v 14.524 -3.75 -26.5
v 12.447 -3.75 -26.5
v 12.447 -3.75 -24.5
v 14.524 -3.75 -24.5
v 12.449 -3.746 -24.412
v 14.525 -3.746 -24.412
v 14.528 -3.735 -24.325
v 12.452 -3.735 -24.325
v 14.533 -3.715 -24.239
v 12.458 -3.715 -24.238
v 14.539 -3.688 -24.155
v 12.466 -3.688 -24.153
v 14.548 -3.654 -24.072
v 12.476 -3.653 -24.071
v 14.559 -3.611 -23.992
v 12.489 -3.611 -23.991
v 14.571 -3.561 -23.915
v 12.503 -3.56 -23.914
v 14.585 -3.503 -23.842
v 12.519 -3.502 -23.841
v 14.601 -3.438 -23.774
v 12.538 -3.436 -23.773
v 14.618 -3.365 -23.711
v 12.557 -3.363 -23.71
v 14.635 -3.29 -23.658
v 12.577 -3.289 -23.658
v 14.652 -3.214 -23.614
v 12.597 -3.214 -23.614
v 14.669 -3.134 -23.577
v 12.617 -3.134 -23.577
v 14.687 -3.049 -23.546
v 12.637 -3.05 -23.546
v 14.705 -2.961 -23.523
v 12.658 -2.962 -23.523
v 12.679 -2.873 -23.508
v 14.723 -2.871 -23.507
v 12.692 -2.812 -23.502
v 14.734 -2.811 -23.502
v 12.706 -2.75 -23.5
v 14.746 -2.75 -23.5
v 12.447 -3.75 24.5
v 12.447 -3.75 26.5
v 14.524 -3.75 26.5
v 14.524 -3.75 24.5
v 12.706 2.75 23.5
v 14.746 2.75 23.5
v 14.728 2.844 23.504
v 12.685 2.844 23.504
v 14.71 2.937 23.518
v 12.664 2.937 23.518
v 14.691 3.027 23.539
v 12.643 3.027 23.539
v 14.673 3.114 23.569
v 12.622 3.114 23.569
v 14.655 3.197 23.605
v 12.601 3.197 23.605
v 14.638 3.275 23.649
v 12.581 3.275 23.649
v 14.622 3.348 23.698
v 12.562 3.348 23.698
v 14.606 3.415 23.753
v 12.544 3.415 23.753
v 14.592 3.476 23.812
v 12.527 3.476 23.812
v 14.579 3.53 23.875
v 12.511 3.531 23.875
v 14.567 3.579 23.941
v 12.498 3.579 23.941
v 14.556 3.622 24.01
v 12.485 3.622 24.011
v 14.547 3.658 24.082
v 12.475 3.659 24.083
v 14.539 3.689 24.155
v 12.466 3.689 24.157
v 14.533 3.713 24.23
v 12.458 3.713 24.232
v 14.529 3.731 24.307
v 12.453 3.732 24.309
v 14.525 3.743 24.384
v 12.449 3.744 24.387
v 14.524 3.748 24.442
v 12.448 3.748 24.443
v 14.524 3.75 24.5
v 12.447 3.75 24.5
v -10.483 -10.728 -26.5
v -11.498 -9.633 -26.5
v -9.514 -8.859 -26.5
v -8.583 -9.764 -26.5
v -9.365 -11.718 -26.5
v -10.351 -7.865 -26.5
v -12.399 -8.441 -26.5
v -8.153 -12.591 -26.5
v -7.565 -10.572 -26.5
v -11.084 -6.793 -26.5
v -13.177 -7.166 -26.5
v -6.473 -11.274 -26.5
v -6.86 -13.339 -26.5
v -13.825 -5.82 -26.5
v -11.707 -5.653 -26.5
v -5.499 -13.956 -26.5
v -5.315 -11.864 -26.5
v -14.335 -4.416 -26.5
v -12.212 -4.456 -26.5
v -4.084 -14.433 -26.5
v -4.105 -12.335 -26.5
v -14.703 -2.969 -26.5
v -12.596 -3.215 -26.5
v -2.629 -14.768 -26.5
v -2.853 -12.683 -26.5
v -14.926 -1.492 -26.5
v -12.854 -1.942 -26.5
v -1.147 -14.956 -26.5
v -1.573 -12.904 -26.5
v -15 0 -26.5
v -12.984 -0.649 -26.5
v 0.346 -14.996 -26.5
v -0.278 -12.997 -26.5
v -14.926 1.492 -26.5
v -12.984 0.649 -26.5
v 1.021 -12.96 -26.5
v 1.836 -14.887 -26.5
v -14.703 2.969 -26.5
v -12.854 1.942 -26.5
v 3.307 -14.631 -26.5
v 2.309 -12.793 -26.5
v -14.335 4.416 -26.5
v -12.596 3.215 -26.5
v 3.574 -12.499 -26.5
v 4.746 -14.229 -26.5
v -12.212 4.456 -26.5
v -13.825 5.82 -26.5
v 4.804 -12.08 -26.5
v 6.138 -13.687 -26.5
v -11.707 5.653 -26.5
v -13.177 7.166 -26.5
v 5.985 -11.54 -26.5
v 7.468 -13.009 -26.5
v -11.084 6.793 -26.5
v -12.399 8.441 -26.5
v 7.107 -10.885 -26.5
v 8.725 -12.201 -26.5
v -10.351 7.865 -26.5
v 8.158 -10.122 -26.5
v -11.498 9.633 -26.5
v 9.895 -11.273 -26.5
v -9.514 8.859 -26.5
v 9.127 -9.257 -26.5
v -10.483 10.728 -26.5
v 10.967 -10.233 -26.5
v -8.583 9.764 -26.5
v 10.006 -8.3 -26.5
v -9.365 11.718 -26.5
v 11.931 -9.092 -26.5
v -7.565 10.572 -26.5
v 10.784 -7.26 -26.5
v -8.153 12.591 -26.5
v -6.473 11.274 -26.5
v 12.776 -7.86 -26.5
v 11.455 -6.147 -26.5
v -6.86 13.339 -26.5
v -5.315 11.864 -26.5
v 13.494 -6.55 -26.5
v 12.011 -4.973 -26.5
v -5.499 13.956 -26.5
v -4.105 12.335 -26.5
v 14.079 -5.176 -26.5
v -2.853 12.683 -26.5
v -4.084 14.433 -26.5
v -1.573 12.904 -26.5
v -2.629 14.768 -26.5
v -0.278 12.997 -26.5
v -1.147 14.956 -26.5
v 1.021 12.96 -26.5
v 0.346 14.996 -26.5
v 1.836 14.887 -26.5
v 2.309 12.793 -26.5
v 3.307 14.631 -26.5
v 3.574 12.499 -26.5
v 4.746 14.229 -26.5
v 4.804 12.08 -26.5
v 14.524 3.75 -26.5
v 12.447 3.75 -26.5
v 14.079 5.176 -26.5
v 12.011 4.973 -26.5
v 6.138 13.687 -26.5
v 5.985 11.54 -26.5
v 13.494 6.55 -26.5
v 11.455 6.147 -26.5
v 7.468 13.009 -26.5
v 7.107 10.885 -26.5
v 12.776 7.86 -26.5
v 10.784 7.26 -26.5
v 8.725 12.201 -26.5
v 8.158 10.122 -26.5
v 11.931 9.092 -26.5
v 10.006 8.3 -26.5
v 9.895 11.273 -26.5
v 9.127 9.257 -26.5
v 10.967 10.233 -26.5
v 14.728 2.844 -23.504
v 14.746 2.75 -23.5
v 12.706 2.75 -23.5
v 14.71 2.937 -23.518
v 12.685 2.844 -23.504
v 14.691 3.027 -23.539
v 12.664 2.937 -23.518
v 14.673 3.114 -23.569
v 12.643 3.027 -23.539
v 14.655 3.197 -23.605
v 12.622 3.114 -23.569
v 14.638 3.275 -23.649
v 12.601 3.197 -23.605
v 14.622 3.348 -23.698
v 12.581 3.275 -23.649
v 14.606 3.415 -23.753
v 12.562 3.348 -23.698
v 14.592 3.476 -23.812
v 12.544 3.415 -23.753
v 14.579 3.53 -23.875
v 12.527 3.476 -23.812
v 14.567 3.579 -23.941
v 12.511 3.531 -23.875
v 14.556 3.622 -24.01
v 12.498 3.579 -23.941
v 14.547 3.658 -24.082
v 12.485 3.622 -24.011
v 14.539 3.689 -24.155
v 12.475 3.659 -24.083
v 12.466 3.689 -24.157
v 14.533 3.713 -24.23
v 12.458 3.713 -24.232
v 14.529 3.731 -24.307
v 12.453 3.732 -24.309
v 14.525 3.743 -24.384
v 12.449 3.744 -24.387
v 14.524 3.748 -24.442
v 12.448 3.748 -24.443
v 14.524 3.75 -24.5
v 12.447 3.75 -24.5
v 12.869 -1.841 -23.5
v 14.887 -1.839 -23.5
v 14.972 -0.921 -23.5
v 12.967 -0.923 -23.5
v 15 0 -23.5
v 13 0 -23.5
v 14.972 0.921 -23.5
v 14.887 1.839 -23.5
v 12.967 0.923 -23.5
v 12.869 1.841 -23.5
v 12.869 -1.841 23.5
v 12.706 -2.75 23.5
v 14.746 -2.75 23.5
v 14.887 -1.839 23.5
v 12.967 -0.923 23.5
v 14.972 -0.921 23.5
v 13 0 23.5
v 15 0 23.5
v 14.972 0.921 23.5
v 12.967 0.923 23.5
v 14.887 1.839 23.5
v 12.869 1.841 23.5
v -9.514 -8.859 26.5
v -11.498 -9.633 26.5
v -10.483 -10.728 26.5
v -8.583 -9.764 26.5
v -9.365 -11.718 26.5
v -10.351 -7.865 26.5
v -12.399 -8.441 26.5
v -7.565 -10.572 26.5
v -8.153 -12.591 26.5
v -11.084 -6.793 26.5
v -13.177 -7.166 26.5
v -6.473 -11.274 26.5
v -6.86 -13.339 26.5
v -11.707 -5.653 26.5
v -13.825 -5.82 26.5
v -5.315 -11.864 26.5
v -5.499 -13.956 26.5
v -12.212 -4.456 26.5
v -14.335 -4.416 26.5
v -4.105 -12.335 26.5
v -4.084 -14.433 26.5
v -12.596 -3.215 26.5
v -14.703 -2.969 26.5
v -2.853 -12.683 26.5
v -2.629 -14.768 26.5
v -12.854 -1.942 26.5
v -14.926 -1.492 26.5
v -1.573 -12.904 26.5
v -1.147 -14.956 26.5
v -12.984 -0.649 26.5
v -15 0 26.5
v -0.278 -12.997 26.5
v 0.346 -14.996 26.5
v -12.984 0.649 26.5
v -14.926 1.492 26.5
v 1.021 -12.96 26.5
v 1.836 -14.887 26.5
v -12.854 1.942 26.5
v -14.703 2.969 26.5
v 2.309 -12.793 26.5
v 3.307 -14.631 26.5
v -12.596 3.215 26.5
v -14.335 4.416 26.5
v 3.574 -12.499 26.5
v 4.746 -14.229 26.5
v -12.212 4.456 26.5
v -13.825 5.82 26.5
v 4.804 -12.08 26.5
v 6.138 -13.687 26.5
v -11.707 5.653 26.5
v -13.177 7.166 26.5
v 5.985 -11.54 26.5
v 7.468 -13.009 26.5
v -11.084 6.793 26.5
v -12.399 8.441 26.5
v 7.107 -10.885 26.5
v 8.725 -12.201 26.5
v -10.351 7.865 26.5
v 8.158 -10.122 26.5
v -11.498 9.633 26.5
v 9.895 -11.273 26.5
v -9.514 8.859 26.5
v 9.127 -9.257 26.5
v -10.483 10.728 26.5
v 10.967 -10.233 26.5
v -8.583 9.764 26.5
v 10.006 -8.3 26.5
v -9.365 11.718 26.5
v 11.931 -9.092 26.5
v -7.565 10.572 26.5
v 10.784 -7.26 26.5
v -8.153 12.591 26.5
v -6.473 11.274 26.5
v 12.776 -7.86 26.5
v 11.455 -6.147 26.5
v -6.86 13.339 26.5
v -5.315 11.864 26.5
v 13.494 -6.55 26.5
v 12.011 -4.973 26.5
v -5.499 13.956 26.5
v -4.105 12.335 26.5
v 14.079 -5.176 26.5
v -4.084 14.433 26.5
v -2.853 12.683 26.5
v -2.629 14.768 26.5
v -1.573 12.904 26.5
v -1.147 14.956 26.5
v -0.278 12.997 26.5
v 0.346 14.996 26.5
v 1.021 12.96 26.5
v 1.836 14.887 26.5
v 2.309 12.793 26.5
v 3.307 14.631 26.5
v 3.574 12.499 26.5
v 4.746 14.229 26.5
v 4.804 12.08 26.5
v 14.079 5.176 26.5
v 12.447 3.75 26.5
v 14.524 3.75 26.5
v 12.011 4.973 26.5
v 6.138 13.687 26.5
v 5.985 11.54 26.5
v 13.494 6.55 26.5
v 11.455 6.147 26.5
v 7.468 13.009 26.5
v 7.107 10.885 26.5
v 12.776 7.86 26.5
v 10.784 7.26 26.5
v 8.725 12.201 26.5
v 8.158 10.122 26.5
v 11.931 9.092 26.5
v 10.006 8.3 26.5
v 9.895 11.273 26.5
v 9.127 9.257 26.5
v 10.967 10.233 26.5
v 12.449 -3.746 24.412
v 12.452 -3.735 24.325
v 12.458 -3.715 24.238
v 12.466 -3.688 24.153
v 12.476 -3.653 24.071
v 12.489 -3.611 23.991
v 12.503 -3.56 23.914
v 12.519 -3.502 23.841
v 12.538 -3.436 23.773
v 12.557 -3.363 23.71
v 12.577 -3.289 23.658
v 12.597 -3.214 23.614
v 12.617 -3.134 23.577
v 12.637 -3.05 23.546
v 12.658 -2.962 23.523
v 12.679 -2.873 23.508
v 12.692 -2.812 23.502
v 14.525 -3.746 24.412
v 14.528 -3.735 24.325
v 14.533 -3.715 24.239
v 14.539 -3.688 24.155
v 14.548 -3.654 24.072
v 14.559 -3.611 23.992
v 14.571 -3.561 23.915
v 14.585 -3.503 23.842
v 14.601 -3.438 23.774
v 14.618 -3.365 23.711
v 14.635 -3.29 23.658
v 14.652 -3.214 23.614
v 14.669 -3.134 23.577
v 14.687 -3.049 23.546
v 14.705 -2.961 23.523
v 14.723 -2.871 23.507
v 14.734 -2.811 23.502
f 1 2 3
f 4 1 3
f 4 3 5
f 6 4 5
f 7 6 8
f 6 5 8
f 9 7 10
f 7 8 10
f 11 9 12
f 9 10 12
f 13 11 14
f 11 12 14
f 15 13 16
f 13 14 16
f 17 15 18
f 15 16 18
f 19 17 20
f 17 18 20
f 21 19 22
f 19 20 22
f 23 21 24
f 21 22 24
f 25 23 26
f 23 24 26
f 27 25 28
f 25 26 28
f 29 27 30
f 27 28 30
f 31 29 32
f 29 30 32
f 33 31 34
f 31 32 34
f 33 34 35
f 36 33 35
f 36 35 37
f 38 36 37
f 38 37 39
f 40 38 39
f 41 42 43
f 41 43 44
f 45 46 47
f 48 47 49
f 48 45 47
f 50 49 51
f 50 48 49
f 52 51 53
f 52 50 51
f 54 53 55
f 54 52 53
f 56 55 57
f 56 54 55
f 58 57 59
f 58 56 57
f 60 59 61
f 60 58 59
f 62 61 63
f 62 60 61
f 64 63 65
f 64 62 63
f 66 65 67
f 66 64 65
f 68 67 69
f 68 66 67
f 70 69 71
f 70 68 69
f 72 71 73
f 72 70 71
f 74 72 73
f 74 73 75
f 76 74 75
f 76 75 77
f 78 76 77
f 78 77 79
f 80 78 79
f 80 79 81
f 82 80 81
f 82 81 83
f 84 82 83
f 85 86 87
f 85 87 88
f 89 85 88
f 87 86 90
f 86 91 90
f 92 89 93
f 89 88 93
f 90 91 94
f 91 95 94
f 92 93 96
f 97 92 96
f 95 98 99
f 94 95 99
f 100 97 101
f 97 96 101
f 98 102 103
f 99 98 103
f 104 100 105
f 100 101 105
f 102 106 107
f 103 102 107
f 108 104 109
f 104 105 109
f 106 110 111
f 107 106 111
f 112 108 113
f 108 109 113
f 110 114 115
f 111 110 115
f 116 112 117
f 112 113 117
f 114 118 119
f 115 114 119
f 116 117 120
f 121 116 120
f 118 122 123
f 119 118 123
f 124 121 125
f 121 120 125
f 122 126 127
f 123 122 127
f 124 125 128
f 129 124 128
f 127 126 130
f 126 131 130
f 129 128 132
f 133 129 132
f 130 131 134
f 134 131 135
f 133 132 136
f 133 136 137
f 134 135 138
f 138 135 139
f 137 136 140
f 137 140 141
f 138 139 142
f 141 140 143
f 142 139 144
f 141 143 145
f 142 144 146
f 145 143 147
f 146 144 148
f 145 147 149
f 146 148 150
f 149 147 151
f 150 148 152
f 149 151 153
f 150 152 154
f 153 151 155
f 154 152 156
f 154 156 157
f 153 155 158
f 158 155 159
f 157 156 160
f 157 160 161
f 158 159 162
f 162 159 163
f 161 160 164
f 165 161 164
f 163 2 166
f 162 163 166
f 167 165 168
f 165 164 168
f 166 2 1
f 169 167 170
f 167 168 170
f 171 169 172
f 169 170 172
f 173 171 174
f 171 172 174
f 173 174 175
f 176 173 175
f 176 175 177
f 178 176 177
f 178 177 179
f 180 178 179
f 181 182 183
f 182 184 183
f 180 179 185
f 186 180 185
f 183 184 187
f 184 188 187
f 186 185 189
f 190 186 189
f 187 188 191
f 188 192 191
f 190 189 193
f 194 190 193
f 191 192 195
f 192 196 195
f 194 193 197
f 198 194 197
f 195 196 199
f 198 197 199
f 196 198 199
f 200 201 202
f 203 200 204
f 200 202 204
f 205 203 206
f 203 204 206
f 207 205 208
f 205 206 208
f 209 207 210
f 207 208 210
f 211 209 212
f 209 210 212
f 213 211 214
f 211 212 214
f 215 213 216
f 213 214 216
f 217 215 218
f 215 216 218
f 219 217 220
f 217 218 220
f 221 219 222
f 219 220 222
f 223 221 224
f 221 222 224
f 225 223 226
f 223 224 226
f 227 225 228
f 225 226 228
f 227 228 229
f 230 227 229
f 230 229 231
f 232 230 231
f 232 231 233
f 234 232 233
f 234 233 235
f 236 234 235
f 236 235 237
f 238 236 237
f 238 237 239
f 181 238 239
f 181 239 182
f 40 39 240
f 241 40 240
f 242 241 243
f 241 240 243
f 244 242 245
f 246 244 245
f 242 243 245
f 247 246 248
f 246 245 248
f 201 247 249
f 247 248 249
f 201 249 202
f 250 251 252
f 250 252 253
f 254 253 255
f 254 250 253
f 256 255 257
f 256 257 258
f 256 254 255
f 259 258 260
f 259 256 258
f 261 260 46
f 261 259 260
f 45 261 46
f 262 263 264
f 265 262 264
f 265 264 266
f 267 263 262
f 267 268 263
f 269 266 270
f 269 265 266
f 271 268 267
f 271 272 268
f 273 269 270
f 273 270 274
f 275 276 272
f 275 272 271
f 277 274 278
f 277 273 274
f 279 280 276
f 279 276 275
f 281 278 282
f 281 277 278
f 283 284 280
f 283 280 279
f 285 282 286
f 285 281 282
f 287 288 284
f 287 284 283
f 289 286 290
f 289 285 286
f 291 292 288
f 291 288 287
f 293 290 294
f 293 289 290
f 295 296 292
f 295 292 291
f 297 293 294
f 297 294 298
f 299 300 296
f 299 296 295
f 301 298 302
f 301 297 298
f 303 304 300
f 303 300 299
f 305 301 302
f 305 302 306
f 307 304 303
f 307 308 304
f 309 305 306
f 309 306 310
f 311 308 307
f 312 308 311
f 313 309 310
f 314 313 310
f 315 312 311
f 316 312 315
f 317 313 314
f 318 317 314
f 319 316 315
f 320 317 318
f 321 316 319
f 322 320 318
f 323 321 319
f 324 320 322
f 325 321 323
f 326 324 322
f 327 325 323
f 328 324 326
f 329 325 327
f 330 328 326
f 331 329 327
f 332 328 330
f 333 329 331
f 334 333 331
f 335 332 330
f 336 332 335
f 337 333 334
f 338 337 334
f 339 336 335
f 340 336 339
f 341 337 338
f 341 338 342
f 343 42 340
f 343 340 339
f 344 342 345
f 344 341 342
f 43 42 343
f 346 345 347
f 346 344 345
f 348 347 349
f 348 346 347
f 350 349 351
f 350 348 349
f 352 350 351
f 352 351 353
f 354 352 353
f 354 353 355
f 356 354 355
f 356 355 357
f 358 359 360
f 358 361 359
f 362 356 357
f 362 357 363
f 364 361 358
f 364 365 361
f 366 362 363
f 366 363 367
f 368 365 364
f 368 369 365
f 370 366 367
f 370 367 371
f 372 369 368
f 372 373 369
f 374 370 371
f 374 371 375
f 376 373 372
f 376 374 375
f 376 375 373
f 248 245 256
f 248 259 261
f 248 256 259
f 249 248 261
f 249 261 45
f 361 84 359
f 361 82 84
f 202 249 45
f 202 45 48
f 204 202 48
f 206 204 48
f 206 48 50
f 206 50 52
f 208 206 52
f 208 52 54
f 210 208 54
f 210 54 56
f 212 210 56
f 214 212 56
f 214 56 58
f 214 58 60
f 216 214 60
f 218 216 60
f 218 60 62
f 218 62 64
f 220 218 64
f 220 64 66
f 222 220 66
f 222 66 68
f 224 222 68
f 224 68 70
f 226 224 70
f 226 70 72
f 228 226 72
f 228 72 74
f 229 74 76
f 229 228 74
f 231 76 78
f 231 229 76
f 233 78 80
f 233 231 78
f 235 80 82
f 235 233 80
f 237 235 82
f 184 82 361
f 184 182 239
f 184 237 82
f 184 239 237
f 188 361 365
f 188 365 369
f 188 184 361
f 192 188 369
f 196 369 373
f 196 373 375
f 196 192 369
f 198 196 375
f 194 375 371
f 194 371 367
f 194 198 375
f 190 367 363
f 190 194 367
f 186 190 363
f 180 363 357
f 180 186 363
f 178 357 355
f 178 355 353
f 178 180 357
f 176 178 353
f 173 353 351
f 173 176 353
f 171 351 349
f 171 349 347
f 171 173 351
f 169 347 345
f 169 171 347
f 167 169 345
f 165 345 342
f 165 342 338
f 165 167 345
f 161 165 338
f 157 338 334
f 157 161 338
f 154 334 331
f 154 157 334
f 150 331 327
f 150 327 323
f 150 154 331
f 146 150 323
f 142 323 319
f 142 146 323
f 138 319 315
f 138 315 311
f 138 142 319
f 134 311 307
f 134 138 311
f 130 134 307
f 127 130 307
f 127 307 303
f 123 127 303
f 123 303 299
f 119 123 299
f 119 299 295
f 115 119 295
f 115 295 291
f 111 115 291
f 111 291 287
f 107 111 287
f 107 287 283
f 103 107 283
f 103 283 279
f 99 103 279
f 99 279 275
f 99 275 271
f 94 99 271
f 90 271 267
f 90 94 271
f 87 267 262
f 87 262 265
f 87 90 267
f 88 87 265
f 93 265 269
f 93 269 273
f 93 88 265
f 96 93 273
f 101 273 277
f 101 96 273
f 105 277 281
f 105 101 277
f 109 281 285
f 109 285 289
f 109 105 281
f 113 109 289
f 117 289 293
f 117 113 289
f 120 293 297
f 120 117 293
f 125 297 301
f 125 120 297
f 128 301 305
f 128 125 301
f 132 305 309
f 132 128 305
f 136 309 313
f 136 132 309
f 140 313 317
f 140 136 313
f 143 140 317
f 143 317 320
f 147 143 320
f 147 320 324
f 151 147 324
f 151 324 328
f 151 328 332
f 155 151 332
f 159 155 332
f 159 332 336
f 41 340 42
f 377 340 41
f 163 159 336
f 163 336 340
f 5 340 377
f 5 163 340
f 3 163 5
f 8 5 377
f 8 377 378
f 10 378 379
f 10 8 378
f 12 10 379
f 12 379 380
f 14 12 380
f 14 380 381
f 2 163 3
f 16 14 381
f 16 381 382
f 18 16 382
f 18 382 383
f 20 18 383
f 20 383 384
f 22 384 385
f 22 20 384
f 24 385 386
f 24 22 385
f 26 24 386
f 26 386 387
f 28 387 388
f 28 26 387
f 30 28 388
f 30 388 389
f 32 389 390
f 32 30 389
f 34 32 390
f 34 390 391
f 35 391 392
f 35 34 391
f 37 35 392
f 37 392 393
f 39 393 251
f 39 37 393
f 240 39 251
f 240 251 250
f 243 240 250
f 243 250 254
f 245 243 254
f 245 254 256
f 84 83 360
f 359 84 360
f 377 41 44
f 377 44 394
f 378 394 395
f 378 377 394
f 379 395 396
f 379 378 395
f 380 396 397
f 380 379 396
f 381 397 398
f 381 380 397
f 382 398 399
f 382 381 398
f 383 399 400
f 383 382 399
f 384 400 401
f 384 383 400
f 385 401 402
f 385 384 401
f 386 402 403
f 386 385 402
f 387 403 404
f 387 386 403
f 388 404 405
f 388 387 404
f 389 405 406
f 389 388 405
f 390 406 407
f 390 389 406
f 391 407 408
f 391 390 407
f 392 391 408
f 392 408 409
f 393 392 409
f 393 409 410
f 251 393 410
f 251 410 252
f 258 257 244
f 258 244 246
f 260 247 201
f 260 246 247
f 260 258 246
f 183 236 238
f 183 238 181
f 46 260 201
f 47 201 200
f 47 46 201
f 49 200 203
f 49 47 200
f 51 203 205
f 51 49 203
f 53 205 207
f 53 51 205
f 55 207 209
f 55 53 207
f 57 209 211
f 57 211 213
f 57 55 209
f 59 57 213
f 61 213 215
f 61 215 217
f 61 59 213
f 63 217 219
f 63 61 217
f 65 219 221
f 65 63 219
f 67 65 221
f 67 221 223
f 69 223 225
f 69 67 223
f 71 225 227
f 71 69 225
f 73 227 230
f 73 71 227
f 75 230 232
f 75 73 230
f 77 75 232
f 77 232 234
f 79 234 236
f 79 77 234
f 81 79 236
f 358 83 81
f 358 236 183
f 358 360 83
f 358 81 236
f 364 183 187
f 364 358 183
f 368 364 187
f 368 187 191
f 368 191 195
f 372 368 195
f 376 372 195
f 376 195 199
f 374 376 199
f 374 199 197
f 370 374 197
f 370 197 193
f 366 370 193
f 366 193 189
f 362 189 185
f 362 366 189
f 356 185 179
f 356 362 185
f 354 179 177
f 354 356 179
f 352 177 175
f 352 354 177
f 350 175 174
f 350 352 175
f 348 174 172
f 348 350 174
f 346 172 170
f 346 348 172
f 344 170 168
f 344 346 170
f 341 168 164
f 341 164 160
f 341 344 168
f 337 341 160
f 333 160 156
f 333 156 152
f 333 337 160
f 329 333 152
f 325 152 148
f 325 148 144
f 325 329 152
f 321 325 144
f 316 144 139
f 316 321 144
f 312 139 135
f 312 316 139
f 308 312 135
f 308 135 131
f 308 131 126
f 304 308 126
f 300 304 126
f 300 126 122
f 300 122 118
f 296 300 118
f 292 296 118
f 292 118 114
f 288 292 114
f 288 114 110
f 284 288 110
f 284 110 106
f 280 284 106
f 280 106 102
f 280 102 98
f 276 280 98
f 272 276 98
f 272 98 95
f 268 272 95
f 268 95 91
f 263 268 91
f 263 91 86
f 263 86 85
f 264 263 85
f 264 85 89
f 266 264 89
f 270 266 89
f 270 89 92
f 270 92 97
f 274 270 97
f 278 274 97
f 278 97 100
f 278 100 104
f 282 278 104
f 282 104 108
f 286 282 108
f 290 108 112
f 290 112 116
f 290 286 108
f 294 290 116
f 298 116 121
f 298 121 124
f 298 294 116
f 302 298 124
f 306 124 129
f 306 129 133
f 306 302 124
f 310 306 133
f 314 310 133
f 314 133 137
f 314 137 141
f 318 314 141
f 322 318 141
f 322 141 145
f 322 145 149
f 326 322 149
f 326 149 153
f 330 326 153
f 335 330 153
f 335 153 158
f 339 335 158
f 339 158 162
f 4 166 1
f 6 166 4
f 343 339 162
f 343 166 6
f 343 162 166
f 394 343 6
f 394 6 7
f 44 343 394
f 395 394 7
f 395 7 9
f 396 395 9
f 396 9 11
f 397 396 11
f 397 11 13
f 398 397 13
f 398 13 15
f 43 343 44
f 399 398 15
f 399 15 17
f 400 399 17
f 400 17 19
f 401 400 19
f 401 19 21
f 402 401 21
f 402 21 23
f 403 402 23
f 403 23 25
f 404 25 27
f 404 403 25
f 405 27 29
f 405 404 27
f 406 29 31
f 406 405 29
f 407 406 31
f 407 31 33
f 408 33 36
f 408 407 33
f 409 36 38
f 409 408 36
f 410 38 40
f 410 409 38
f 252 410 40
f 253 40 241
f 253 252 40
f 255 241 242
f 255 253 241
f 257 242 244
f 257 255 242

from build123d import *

# Parameters (mm, degrees)
SKETCH2_R               = 15
SKETCH2_R_2             = 13
BOSS_EXTRUDE1_DEPTH     = 26.5
CUT_EXTRUDE1_REACH      = 35.945
CUT_EXTRUDE1_END_RADIUS = 15


with BuildPart() as part:
    # Sketch2 → Boss-Extrude1 (new, symmetric)
    with BuildSketch(Plane.XY):
        Circle(SKETCH2_R)
        Circle(SKETCH2_R_2, mode=Mode.SUBTRACT)
    extrude(amount=BOSS_EXTRUDE1_DEPTH, both=True)

    # Cut-Extrude1: up to this cylinder (the profile starts inside it)
    cut_extrude1_end = Plane(origin=(0, 0, 0), z_dir=(0, 0, -1)) * Cylinder(CUT_EXTRUDE1_END_RADIUS, 152.939652, mode=Mode.PRIVATE)
    # Sketch3 → Cut-Extrude1 (cut, up to the surface)
    with BuildSketch(Plane(origin=(0, 0, 0), x_dir=(0, 0, -1), z_dir=(1, 0, 0)), mode=Mode.PRIVATE) as cut_extrude1_sk1:
        with BuildLine():
            Line((-26.5, -3.75), (-24.5, -3.75))
            ThreePointArc((-24.5, -3.75), (-23.792893219, -3.457106781), (-23.5, -2.75))
            Line((-23.5, -2.75), (-23.5, 2.75))
            ThreePointArc((-23.5, 2.75), (-23.792893219, 3.457106781), (-24.5, 3.75))
            Line((-24.5, 3.75), (-26.5, 3.75))
            Line((-26.5, 3.75), (-26.5, -3.75))
        make_face()
    cut_extrude1_tool1 = extrude(cut_extrude1_sk1.sketch, amount=CUT_EXTRUDE1_REACH, mode=Mode.PRIVATE) & cut_extrude1_end
    add(cut_extrude1_tool1.solids().sort_by_distance((0, 0, 25.024826))[0], mode=Mode.SUBTRACT)
    # Sketch3 → Cut-Extrude1 (cut, up to the surface)
    with BuildSketch(Plane(origin=(0, 0, 0), x_dir=(0, 0, -1), z_dir=(1, 0, 0)), mode=Mode.PRIVATE) as cut_extrude1_sk2:
        with BuildLine():
            Line((26.5, -3.75), (24.5, -3.75))
            ThreePointArc((24.5, -3.75), (23.792893219, -3.457106781), (23.5, -2.75))
            Line((23.5, -2.75), (23.5, 2.75))
            ThreePointArc((23.5, 2.75), (23.792893219, 3.457106781), (24.5, 3.75))
            Line((24.5, 3.75), (26.5, 3.75))
            Line((26.5, 3.75), (26.5, -3.75))
        make_face()
    cut_extrude1_tool2 = extrude(cut_extrude1_sk2.sketch, amount=CUT_EXTRUDE1_REACH, mode=Mode.PRIVATE) & cut_extrude1_end
    add(cut_extrude1_tool2.solids().sort_by_distance((0, 0, -25.024826))[0], mode=Mode.SUBTRACT)


solid = part.part
